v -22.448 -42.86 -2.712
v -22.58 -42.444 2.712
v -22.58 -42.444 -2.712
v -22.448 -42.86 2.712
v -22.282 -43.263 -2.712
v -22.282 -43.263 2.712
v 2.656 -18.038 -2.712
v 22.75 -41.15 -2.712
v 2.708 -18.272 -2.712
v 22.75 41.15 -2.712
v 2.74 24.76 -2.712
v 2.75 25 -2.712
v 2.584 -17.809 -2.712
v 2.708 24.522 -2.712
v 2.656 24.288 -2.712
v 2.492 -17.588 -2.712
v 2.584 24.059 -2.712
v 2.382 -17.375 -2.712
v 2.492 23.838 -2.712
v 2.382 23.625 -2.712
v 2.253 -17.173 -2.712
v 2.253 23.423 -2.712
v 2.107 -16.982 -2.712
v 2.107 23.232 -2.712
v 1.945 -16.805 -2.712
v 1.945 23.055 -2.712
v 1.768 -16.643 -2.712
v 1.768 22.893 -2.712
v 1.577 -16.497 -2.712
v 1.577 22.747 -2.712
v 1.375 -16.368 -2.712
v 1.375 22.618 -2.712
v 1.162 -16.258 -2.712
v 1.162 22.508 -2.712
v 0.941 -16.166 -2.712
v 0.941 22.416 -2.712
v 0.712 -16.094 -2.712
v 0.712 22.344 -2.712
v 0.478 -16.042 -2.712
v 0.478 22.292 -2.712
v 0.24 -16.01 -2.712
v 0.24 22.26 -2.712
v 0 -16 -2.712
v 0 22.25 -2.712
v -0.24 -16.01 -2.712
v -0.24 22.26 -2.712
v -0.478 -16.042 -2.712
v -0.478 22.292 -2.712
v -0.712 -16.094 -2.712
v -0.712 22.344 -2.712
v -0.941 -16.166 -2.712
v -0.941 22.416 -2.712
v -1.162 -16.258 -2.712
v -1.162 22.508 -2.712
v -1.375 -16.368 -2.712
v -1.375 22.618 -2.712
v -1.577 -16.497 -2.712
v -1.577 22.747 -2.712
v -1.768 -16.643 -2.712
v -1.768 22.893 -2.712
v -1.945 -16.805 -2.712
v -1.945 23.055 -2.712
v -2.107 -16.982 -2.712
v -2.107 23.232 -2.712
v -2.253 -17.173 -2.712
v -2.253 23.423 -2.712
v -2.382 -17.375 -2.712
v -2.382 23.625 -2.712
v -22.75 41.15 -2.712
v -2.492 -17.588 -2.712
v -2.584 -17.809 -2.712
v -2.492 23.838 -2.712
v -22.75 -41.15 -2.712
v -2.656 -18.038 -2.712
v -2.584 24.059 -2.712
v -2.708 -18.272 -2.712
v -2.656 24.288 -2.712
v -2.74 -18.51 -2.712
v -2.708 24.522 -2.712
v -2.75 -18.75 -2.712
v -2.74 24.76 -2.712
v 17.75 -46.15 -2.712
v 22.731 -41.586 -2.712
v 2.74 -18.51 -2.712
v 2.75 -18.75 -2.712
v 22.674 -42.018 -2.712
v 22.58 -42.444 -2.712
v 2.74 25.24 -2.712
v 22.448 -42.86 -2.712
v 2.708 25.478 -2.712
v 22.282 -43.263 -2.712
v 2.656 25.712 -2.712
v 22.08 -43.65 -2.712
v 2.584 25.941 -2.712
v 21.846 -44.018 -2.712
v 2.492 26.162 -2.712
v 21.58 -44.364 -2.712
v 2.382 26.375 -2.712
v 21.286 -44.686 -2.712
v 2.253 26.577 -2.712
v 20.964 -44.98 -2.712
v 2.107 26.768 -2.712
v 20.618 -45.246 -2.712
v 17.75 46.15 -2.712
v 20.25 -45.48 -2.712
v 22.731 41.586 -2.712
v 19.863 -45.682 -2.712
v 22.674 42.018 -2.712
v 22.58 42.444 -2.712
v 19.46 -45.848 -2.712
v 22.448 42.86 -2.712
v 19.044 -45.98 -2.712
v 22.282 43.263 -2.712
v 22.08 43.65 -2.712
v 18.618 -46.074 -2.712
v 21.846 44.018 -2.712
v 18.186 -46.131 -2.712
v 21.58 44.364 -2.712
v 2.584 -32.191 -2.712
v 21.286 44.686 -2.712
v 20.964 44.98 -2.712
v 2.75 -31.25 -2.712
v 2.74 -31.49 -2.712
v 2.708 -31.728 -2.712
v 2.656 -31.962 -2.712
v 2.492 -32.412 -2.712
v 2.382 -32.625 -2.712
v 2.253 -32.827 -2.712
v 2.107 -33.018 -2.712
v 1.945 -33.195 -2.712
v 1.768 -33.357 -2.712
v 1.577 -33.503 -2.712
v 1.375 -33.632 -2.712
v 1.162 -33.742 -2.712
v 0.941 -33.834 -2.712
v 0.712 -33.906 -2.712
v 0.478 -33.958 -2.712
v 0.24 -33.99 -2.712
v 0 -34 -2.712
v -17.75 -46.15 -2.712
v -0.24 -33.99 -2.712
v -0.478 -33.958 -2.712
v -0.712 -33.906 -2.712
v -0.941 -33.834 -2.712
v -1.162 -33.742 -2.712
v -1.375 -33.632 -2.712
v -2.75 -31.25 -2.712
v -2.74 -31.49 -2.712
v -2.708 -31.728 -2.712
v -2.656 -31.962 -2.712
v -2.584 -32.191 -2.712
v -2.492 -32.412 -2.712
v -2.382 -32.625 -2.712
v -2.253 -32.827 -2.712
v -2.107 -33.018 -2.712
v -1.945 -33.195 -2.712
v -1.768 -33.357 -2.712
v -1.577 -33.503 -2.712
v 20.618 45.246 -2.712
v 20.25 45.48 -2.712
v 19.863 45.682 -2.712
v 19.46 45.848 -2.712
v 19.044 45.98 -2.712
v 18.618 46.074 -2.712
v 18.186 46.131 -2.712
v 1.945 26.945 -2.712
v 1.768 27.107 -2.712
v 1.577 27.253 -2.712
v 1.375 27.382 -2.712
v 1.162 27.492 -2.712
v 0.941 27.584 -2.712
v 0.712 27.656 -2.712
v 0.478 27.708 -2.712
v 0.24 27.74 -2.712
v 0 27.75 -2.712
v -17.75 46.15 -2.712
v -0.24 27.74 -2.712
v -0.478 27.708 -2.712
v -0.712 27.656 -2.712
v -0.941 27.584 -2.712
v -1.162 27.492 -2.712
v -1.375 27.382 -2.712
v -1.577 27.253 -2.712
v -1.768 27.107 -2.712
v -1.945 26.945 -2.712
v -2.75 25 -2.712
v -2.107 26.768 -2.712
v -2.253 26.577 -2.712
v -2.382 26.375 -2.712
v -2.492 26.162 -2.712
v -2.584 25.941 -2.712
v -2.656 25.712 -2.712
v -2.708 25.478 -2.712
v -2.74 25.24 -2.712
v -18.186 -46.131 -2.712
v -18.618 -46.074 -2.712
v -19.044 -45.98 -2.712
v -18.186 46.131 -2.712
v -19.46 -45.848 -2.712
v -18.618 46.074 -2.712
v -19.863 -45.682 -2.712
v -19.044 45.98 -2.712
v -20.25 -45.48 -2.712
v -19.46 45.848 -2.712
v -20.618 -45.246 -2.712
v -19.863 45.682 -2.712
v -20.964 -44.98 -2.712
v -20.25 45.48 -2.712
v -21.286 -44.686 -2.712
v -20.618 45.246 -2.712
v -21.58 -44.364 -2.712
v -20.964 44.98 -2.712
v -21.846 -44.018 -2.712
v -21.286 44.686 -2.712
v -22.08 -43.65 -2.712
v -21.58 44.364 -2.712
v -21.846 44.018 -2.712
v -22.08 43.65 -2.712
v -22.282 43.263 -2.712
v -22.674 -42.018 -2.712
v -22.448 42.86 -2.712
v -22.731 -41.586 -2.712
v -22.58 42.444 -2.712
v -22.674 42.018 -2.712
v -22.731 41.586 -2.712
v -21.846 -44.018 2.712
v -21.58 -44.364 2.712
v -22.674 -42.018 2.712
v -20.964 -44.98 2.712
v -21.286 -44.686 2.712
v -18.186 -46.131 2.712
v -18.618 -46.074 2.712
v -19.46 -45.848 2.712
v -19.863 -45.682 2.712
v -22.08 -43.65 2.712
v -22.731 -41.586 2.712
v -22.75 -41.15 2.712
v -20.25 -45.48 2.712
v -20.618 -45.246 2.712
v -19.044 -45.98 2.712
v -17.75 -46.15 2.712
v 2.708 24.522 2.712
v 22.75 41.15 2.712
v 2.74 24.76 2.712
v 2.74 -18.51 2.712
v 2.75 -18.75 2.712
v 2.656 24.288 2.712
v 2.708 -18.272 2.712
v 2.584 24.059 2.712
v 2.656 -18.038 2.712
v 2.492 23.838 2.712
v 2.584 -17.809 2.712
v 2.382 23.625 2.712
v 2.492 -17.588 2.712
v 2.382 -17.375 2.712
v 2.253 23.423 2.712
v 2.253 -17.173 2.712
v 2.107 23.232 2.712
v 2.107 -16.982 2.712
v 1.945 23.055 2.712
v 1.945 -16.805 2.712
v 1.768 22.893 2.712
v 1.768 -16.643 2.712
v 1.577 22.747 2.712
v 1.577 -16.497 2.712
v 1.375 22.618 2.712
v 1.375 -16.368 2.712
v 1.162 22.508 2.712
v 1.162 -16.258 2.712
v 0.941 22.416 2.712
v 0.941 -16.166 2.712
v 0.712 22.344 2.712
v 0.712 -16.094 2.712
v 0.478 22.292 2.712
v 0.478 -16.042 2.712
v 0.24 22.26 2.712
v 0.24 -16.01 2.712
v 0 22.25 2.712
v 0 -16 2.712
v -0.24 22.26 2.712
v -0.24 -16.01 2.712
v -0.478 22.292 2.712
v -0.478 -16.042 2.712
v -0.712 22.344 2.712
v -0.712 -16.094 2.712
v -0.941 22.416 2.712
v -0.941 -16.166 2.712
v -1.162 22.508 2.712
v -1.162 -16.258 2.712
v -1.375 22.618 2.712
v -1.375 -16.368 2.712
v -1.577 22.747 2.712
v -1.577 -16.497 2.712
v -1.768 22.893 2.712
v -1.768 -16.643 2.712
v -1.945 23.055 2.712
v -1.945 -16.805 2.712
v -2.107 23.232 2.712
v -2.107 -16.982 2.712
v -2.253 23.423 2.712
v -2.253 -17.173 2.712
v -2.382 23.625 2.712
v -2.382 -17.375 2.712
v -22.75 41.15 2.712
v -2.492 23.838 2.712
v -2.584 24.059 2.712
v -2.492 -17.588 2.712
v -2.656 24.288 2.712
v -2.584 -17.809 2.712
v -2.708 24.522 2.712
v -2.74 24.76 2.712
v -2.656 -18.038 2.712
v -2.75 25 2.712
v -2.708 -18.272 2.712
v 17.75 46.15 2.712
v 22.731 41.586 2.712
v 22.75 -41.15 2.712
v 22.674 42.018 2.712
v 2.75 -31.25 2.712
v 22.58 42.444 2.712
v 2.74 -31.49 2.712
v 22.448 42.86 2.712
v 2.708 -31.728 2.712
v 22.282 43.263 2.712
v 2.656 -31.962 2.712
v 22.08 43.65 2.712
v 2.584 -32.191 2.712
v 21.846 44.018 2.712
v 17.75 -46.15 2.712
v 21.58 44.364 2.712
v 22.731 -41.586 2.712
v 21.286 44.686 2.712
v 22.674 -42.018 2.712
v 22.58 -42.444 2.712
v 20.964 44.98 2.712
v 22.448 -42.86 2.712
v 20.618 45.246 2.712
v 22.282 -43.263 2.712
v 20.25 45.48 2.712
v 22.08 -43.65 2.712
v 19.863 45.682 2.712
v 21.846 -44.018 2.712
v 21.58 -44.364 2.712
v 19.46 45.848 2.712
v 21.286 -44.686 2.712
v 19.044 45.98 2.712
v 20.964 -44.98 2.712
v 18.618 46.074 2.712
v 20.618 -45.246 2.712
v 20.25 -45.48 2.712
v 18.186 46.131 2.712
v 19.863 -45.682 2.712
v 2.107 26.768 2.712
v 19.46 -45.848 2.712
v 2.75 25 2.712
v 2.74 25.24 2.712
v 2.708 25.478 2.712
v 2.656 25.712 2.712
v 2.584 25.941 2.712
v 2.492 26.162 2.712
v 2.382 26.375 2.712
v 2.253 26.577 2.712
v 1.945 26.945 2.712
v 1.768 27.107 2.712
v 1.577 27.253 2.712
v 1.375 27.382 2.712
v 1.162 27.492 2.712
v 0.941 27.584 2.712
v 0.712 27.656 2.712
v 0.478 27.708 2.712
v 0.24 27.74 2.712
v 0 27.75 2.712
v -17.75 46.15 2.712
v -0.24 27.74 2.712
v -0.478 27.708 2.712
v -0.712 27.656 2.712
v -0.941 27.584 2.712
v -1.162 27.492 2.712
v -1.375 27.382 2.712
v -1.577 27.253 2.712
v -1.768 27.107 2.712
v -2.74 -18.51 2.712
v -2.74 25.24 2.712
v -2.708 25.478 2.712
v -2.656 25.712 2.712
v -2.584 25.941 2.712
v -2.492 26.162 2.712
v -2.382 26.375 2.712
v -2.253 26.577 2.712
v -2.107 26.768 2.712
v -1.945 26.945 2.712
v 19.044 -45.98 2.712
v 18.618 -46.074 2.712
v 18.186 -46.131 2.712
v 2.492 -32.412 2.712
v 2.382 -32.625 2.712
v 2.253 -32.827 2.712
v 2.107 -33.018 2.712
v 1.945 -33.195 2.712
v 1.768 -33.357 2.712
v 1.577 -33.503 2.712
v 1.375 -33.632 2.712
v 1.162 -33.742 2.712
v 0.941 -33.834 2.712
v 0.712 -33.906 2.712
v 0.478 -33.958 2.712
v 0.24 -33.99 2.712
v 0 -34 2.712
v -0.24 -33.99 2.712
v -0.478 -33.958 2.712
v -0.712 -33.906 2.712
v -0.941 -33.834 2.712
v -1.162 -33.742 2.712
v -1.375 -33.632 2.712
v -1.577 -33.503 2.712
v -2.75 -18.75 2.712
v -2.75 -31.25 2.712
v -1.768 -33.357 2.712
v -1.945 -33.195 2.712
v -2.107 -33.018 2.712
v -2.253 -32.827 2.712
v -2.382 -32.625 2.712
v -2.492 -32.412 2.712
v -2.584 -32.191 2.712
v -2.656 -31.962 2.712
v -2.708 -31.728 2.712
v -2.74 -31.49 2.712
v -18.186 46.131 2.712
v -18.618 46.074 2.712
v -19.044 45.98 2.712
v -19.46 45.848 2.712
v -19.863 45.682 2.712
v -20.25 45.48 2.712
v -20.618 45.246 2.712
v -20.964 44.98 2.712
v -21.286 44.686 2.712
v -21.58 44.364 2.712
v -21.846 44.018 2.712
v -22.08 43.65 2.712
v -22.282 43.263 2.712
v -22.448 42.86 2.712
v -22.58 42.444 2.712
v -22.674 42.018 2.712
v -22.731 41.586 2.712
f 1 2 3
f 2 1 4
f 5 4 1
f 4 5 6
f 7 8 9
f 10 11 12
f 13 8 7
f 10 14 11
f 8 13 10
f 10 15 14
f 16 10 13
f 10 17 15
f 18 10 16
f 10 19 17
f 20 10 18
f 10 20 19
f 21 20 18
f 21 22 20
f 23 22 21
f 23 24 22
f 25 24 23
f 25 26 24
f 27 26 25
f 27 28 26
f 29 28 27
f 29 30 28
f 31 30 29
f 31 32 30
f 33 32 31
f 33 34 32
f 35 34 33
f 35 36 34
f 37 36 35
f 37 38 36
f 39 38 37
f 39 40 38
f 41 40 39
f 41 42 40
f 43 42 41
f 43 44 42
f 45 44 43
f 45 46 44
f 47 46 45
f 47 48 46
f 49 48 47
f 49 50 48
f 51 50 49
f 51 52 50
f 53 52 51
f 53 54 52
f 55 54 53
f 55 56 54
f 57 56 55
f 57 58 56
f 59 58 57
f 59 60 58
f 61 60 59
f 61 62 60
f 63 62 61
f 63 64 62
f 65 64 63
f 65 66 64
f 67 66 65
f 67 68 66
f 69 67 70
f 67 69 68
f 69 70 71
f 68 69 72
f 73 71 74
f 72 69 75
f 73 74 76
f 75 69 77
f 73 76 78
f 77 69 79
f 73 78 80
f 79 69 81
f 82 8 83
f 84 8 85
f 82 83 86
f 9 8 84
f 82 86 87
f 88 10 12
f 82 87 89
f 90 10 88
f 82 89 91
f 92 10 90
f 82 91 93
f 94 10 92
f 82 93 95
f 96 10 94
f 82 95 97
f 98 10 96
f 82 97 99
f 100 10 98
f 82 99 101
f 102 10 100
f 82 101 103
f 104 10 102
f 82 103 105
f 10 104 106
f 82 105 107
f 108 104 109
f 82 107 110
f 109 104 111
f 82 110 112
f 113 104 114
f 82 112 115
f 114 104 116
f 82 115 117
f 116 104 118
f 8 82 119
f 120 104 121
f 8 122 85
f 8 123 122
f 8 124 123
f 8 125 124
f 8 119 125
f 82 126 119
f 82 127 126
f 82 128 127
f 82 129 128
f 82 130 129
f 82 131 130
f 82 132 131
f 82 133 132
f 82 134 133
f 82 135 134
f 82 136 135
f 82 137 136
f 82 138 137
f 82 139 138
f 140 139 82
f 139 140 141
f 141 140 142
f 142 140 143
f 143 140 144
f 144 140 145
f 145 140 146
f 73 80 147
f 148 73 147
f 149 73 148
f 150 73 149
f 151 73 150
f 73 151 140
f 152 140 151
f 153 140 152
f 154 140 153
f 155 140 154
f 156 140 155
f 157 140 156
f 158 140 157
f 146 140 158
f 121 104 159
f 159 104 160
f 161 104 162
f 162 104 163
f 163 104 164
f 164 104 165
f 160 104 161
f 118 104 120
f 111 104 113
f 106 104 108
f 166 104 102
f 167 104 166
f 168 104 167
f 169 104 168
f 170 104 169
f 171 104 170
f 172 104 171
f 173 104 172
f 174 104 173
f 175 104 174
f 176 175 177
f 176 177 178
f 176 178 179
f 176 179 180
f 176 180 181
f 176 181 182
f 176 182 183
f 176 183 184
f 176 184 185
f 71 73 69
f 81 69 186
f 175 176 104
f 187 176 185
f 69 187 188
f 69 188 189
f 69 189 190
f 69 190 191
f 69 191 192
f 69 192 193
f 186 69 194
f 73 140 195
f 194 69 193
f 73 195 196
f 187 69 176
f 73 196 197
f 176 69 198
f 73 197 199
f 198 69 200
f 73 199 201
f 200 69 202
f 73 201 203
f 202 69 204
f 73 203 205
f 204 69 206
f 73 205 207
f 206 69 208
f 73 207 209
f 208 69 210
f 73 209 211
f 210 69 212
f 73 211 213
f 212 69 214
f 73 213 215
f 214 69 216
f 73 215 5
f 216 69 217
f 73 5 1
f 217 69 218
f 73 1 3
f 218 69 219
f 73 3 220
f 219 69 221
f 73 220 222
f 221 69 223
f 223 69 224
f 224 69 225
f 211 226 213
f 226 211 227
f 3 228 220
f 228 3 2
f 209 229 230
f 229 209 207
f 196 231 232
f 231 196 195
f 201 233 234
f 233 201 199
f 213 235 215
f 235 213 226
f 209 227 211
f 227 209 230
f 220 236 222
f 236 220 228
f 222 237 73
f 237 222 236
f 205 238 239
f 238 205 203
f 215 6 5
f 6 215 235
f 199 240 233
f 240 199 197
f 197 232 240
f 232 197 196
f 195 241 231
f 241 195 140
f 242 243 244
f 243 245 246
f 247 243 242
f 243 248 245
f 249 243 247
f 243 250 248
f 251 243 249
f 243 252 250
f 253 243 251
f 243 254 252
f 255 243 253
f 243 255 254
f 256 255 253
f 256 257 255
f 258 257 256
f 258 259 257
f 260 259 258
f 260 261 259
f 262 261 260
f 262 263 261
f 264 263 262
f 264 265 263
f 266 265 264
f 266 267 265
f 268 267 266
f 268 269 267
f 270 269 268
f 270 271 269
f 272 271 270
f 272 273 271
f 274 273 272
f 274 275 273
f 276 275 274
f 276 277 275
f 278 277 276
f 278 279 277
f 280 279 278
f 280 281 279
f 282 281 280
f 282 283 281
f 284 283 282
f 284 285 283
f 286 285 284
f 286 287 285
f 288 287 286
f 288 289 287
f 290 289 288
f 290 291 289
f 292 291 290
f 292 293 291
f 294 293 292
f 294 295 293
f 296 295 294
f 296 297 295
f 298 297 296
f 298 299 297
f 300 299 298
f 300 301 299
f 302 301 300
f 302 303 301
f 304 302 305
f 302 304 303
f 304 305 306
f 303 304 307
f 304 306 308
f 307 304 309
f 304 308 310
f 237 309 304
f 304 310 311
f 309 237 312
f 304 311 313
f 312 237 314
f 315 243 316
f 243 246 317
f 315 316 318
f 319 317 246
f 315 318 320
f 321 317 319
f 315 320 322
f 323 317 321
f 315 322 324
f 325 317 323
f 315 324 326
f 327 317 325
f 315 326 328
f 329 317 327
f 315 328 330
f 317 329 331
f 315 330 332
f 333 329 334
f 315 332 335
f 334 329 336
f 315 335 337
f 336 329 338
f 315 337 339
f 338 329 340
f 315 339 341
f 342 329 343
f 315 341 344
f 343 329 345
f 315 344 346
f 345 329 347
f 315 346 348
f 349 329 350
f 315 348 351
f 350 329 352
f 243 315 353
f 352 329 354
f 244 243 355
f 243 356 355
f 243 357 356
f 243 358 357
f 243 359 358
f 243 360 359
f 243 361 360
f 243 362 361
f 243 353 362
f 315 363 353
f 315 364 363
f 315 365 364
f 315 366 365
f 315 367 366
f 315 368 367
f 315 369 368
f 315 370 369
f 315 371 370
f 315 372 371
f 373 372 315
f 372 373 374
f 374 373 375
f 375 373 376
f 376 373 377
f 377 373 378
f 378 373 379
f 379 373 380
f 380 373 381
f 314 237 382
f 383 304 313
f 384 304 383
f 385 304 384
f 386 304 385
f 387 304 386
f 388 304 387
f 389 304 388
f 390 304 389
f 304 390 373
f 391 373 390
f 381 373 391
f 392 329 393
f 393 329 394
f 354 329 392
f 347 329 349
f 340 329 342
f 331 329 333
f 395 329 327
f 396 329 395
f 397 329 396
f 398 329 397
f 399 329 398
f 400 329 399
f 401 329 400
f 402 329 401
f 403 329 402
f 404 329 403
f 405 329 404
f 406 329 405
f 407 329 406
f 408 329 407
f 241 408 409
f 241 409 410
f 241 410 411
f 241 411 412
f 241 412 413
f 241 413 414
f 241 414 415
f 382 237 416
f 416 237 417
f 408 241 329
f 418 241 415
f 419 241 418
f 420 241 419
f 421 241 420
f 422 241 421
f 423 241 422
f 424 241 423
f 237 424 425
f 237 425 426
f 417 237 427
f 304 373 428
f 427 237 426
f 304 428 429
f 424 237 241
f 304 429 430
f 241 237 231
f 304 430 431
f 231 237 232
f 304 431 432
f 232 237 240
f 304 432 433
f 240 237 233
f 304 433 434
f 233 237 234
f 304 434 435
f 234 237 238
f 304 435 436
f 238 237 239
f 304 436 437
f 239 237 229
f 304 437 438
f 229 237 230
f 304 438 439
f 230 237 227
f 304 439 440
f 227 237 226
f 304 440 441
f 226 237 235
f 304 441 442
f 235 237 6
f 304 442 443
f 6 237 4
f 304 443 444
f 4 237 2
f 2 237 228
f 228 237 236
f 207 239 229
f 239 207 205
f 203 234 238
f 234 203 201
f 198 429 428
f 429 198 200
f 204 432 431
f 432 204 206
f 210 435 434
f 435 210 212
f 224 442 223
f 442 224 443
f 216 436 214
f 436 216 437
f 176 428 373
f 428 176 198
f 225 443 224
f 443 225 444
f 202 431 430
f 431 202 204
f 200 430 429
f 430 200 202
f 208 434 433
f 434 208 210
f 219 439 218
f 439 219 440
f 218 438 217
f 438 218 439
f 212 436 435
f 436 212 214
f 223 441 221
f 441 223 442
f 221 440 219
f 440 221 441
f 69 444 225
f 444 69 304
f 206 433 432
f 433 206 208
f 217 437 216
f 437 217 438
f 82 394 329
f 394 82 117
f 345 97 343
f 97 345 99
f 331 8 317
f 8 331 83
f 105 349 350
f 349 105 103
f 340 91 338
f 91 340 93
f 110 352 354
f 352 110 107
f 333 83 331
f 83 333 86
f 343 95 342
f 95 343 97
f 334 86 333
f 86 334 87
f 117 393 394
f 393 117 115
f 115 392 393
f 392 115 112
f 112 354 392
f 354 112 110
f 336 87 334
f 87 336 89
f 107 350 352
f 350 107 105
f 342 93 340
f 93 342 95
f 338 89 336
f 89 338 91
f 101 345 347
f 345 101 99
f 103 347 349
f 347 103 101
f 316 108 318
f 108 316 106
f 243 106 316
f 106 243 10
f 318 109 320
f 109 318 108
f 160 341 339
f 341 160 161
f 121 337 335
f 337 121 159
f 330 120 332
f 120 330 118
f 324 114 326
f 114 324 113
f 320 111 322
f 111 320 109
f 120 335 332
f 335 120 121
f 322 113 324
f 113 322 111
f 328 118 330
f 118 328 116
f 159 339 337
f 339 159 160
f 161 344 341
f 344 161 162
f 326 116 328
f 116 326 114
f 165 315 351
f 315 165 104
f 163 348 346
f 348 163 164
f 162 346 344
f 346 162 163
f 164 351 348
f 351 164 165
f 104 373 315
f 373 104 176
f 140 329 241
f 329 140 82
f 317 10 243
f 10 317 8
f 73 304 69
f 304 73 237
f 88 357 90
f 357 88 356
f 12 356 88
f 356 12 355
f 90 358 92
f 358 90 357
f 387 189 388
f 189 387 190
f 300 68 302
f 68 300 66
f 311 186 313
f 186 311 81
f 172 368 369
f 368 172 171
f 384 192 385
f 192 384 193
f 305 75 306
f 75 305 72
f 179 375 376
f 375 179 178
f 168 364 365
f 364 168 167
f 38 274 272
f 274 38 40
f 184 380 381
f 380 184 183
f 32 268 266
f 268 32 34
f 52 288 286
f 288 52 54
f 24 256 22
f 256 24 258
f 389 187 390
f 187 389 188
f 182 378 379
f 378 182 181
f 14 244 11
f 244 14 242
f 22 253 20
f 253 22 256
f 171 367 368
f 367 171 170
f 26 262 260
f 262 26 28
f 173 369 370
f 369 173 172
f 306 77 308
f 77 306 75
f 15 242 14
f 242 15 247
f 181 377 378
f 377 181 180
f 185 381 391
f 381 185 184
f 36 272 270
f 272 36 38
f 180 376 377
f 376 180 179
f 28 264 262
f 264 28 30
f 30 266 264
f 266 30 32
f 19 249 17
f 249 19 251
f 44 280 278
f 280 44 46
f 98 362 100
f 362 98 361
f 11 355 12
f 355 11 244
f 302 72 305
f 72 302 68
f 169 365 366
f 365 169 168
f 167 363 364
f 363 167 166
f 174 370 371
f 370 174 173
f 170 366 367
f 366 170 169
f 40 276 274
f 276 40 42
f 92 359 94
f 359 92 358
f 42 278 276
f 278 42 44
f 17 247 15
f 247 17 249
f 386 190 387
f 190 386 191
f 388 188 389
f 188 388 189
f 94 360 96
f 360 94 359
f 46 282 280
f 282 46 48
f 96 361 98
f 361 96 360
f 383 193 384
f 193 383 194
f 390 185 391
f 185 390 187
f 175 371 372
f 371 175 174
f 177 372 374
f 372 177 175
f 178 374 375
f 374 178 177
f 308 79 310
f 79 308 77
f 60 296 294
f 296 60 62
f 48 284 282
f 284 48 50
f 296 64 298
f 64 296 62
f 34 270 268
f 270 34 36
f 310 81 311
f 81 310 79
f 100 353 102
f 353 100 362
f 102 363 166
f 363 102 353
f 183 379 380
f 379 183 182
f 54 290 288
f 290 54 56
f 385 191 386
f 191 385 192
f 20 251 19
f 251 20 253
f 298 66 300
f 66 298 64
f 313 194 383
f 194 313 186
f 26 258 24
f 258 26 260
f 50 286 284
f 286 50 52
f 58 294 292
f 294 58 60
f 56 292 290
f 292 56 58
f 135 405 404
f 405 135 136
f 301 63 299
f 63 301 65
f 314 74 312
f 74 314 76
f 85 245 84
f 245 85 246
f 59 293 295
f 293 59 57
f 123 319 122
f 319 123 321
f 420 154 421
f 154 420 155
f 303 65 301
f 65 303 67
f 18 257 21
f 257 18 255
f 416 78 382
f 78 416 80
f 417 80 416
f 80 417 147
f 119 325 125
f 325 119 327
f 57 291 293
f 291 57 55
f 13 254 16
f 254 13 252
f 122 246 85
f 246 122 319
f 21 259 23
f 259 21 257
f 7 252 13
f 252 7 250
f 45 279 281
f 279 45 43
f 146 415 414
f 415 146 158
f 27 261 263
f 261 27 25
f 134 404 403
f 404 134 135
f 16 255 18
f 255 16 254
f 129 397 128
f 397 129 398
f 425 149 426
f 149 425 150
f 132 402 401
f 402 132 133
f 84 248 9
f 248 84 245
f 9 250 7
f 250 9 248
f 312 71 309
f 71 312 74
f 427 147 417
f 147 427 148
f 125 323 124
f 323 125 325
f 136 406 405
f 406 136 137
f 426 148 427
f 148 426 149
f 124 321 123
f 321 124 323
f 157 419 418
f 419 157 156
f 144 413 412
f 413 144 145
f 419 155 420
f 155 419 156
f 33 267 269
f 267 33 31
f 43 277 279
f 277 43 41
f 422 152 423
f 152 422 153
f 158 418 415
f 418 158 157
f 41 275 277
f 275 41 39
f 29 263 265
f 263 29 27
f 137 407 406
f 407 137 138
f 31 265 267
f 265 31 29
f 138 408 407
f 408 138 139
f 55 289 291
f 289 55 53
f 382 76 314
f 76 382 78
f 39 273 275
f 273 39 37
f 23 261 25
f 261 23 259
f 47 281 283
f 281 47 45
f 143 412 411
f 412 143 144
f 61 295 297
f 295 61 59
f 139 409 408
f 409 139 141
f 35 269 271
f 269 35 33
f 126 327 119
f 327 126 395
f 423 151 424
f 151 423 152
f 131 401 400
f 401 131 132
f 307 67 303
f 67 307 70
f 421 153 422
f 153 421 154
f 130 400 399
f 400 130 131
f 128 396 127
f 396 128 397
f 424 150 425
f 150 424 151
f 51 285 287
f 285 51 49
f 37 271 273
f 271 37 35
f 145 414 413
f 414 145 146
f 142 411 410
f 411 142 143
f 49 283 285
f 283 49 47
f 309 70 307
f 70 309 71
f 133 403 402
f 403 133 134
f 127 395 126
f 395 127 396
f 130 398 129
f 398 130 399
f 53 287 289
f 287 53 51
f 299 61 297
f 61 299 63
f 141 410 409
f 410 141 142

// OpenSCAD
/*
    A Base for Radio Mounting Tower for Ham Radios
    Author: porcej@gmail.com
    Date: November 6, 2017

*/

// Arbitrary dimensions
thickness = 3; // Thicknesses of walls, etc.
quality=72; // "Roundness" of circles.
tolerances = 0.15; // Something to add for shrinkage
compensate = .6; // Multiplier "fudging" constant for shrinkage compensation
corner_radius = 5; // radius of tower's corners

// Screw dimensions
m4 = 4 + (2 * (tolerances + compensate)); // Diameter of M4 screw shaft
m5 = 5 + (2 * (tolerances + compensate)); // Diameter of M5 screw shaft
// Radio dimensions
radio_count = 2; // Number of radios on tower
radio_width = 150.5; // Width of radio
radio_height = 39.5; // Height of radio
radio_screw_spaceing = 50; // Spaceing between mounting screws on radio

// Tower Dimensions
tower_width = radio_width + (2 * (tolerances + thickness)); // Overall width od tower (X)
tower_height = radio_count * (1.75 * (radio_height + tolerances)) + (2 * thickness); // Overall height of tower (Y)
tower_depth = (1.5 * radio_screw_spaceing) + (2 * (thickness + tolerances + m4)); // Depth of tower (Z)

include <MCAD/boxes.scad>
$fn = quality;
//radioTower();

small_radio_width = 139.5;
small_radio_screew_length = 7;

adapter_thickness = (radio_width - small_radio_width-tolerances )/2;

adapter_height = radio_height+2*thickness;

adapter_depth = tower_depth;

echo(str("Adapter Thickness: ", adapter_thickness, "mm"));

difference(){
    roundedBox([adapter_height, adapter_depth, adapter_thickness], corner_radius, true);
    translate([0,radio_screw_spaceing / 2,0]) 
        cylinder(h=adapter_thickness, r=m4 / 2, center=true);
    
    hull(){
        translate([0,-(5 * radio_screw_spaceing / 8),0]) 
            cylinder(h=adapter_thickness, r=m4 / 2, center=true);
        translate([0,-(3 * radio_screw_spaceing / 8),0])
            cylinder(h=adapter_thickness, r=m4 / 2, center=true);
    }   // end of hull
}   // end of difference





module radioTower(){    
    difference(){
        // First we create the tower has a box with rounded corners
        roundedBox([tower_width, tower_height, tower_depth], corner_radius, true);
        
        
        base_offset = -tower_height / 2 + thickness;   
        
        // Loop over all of the radio bays to add mounting screw holes
        for (radio = [0:radio_count-1]) {
            mounting_hole_y = base_offset + ((1 + 1.5 * radio) * (radio_height + tolerances));
            // Then we cut out the rear screw holes
            translate([0,mounting_hole_y,-radio_screw_spaceing / 2])
            rotate([0,90,0])
            cylinder(h=tower_width, r=m4 / 2, center=true);
            
            // Next the front screw "trench"
            translate([0,mounting_hole_y,radio_screw_spaceing / 2])
            rotate([0,90,0])
            hull(){
                translate([-radio_screw_spaceing / 8,0,0]) cylinder(h=tower_width, r=m4 / 2, center=true);
                translate([radio_screw_spaceing / 8,0,0]) cylinder(h=tower_width, r=m4 / 2, center=true);
            }   // end of hull
        }   // end of for
        
        // Remove the top and bottom mounting bracket slots
        rotate([90,0,0]) cylinder(h=tower_height, r=m5/2, center=true); 
        translate([-radio_width/4,0,-tower_height/4]) mountingSlots();
        translate([-radio_width/4,0,tower_height/4]) mountingSlots();
        translate([radio_width/4,0,-tower_height/4]) mountingSlots();
        translate([radio_width/4,0,tower_height/4]) mountingSlots();
        
        // Next we create the inner box and remove it from the outterbox
        roundedBox([tower_width - (2 * thickness), tower_height - ( 2 * thickness), tower_depth], corner_radius, true);
    }   // end of difference
}   // radioTower()


module mountingSlots(){
    rotate([90,0,0])
    hull(){ 
        translate([-radio_width/10,0,0])
            cylinder(h=tower_height, r=m5/2, center=true);
        translate([radio_width/10,0,0])
            cylinder(h=tower_height, r=m5/2, center=true);
    }
}   // mountSlots()
